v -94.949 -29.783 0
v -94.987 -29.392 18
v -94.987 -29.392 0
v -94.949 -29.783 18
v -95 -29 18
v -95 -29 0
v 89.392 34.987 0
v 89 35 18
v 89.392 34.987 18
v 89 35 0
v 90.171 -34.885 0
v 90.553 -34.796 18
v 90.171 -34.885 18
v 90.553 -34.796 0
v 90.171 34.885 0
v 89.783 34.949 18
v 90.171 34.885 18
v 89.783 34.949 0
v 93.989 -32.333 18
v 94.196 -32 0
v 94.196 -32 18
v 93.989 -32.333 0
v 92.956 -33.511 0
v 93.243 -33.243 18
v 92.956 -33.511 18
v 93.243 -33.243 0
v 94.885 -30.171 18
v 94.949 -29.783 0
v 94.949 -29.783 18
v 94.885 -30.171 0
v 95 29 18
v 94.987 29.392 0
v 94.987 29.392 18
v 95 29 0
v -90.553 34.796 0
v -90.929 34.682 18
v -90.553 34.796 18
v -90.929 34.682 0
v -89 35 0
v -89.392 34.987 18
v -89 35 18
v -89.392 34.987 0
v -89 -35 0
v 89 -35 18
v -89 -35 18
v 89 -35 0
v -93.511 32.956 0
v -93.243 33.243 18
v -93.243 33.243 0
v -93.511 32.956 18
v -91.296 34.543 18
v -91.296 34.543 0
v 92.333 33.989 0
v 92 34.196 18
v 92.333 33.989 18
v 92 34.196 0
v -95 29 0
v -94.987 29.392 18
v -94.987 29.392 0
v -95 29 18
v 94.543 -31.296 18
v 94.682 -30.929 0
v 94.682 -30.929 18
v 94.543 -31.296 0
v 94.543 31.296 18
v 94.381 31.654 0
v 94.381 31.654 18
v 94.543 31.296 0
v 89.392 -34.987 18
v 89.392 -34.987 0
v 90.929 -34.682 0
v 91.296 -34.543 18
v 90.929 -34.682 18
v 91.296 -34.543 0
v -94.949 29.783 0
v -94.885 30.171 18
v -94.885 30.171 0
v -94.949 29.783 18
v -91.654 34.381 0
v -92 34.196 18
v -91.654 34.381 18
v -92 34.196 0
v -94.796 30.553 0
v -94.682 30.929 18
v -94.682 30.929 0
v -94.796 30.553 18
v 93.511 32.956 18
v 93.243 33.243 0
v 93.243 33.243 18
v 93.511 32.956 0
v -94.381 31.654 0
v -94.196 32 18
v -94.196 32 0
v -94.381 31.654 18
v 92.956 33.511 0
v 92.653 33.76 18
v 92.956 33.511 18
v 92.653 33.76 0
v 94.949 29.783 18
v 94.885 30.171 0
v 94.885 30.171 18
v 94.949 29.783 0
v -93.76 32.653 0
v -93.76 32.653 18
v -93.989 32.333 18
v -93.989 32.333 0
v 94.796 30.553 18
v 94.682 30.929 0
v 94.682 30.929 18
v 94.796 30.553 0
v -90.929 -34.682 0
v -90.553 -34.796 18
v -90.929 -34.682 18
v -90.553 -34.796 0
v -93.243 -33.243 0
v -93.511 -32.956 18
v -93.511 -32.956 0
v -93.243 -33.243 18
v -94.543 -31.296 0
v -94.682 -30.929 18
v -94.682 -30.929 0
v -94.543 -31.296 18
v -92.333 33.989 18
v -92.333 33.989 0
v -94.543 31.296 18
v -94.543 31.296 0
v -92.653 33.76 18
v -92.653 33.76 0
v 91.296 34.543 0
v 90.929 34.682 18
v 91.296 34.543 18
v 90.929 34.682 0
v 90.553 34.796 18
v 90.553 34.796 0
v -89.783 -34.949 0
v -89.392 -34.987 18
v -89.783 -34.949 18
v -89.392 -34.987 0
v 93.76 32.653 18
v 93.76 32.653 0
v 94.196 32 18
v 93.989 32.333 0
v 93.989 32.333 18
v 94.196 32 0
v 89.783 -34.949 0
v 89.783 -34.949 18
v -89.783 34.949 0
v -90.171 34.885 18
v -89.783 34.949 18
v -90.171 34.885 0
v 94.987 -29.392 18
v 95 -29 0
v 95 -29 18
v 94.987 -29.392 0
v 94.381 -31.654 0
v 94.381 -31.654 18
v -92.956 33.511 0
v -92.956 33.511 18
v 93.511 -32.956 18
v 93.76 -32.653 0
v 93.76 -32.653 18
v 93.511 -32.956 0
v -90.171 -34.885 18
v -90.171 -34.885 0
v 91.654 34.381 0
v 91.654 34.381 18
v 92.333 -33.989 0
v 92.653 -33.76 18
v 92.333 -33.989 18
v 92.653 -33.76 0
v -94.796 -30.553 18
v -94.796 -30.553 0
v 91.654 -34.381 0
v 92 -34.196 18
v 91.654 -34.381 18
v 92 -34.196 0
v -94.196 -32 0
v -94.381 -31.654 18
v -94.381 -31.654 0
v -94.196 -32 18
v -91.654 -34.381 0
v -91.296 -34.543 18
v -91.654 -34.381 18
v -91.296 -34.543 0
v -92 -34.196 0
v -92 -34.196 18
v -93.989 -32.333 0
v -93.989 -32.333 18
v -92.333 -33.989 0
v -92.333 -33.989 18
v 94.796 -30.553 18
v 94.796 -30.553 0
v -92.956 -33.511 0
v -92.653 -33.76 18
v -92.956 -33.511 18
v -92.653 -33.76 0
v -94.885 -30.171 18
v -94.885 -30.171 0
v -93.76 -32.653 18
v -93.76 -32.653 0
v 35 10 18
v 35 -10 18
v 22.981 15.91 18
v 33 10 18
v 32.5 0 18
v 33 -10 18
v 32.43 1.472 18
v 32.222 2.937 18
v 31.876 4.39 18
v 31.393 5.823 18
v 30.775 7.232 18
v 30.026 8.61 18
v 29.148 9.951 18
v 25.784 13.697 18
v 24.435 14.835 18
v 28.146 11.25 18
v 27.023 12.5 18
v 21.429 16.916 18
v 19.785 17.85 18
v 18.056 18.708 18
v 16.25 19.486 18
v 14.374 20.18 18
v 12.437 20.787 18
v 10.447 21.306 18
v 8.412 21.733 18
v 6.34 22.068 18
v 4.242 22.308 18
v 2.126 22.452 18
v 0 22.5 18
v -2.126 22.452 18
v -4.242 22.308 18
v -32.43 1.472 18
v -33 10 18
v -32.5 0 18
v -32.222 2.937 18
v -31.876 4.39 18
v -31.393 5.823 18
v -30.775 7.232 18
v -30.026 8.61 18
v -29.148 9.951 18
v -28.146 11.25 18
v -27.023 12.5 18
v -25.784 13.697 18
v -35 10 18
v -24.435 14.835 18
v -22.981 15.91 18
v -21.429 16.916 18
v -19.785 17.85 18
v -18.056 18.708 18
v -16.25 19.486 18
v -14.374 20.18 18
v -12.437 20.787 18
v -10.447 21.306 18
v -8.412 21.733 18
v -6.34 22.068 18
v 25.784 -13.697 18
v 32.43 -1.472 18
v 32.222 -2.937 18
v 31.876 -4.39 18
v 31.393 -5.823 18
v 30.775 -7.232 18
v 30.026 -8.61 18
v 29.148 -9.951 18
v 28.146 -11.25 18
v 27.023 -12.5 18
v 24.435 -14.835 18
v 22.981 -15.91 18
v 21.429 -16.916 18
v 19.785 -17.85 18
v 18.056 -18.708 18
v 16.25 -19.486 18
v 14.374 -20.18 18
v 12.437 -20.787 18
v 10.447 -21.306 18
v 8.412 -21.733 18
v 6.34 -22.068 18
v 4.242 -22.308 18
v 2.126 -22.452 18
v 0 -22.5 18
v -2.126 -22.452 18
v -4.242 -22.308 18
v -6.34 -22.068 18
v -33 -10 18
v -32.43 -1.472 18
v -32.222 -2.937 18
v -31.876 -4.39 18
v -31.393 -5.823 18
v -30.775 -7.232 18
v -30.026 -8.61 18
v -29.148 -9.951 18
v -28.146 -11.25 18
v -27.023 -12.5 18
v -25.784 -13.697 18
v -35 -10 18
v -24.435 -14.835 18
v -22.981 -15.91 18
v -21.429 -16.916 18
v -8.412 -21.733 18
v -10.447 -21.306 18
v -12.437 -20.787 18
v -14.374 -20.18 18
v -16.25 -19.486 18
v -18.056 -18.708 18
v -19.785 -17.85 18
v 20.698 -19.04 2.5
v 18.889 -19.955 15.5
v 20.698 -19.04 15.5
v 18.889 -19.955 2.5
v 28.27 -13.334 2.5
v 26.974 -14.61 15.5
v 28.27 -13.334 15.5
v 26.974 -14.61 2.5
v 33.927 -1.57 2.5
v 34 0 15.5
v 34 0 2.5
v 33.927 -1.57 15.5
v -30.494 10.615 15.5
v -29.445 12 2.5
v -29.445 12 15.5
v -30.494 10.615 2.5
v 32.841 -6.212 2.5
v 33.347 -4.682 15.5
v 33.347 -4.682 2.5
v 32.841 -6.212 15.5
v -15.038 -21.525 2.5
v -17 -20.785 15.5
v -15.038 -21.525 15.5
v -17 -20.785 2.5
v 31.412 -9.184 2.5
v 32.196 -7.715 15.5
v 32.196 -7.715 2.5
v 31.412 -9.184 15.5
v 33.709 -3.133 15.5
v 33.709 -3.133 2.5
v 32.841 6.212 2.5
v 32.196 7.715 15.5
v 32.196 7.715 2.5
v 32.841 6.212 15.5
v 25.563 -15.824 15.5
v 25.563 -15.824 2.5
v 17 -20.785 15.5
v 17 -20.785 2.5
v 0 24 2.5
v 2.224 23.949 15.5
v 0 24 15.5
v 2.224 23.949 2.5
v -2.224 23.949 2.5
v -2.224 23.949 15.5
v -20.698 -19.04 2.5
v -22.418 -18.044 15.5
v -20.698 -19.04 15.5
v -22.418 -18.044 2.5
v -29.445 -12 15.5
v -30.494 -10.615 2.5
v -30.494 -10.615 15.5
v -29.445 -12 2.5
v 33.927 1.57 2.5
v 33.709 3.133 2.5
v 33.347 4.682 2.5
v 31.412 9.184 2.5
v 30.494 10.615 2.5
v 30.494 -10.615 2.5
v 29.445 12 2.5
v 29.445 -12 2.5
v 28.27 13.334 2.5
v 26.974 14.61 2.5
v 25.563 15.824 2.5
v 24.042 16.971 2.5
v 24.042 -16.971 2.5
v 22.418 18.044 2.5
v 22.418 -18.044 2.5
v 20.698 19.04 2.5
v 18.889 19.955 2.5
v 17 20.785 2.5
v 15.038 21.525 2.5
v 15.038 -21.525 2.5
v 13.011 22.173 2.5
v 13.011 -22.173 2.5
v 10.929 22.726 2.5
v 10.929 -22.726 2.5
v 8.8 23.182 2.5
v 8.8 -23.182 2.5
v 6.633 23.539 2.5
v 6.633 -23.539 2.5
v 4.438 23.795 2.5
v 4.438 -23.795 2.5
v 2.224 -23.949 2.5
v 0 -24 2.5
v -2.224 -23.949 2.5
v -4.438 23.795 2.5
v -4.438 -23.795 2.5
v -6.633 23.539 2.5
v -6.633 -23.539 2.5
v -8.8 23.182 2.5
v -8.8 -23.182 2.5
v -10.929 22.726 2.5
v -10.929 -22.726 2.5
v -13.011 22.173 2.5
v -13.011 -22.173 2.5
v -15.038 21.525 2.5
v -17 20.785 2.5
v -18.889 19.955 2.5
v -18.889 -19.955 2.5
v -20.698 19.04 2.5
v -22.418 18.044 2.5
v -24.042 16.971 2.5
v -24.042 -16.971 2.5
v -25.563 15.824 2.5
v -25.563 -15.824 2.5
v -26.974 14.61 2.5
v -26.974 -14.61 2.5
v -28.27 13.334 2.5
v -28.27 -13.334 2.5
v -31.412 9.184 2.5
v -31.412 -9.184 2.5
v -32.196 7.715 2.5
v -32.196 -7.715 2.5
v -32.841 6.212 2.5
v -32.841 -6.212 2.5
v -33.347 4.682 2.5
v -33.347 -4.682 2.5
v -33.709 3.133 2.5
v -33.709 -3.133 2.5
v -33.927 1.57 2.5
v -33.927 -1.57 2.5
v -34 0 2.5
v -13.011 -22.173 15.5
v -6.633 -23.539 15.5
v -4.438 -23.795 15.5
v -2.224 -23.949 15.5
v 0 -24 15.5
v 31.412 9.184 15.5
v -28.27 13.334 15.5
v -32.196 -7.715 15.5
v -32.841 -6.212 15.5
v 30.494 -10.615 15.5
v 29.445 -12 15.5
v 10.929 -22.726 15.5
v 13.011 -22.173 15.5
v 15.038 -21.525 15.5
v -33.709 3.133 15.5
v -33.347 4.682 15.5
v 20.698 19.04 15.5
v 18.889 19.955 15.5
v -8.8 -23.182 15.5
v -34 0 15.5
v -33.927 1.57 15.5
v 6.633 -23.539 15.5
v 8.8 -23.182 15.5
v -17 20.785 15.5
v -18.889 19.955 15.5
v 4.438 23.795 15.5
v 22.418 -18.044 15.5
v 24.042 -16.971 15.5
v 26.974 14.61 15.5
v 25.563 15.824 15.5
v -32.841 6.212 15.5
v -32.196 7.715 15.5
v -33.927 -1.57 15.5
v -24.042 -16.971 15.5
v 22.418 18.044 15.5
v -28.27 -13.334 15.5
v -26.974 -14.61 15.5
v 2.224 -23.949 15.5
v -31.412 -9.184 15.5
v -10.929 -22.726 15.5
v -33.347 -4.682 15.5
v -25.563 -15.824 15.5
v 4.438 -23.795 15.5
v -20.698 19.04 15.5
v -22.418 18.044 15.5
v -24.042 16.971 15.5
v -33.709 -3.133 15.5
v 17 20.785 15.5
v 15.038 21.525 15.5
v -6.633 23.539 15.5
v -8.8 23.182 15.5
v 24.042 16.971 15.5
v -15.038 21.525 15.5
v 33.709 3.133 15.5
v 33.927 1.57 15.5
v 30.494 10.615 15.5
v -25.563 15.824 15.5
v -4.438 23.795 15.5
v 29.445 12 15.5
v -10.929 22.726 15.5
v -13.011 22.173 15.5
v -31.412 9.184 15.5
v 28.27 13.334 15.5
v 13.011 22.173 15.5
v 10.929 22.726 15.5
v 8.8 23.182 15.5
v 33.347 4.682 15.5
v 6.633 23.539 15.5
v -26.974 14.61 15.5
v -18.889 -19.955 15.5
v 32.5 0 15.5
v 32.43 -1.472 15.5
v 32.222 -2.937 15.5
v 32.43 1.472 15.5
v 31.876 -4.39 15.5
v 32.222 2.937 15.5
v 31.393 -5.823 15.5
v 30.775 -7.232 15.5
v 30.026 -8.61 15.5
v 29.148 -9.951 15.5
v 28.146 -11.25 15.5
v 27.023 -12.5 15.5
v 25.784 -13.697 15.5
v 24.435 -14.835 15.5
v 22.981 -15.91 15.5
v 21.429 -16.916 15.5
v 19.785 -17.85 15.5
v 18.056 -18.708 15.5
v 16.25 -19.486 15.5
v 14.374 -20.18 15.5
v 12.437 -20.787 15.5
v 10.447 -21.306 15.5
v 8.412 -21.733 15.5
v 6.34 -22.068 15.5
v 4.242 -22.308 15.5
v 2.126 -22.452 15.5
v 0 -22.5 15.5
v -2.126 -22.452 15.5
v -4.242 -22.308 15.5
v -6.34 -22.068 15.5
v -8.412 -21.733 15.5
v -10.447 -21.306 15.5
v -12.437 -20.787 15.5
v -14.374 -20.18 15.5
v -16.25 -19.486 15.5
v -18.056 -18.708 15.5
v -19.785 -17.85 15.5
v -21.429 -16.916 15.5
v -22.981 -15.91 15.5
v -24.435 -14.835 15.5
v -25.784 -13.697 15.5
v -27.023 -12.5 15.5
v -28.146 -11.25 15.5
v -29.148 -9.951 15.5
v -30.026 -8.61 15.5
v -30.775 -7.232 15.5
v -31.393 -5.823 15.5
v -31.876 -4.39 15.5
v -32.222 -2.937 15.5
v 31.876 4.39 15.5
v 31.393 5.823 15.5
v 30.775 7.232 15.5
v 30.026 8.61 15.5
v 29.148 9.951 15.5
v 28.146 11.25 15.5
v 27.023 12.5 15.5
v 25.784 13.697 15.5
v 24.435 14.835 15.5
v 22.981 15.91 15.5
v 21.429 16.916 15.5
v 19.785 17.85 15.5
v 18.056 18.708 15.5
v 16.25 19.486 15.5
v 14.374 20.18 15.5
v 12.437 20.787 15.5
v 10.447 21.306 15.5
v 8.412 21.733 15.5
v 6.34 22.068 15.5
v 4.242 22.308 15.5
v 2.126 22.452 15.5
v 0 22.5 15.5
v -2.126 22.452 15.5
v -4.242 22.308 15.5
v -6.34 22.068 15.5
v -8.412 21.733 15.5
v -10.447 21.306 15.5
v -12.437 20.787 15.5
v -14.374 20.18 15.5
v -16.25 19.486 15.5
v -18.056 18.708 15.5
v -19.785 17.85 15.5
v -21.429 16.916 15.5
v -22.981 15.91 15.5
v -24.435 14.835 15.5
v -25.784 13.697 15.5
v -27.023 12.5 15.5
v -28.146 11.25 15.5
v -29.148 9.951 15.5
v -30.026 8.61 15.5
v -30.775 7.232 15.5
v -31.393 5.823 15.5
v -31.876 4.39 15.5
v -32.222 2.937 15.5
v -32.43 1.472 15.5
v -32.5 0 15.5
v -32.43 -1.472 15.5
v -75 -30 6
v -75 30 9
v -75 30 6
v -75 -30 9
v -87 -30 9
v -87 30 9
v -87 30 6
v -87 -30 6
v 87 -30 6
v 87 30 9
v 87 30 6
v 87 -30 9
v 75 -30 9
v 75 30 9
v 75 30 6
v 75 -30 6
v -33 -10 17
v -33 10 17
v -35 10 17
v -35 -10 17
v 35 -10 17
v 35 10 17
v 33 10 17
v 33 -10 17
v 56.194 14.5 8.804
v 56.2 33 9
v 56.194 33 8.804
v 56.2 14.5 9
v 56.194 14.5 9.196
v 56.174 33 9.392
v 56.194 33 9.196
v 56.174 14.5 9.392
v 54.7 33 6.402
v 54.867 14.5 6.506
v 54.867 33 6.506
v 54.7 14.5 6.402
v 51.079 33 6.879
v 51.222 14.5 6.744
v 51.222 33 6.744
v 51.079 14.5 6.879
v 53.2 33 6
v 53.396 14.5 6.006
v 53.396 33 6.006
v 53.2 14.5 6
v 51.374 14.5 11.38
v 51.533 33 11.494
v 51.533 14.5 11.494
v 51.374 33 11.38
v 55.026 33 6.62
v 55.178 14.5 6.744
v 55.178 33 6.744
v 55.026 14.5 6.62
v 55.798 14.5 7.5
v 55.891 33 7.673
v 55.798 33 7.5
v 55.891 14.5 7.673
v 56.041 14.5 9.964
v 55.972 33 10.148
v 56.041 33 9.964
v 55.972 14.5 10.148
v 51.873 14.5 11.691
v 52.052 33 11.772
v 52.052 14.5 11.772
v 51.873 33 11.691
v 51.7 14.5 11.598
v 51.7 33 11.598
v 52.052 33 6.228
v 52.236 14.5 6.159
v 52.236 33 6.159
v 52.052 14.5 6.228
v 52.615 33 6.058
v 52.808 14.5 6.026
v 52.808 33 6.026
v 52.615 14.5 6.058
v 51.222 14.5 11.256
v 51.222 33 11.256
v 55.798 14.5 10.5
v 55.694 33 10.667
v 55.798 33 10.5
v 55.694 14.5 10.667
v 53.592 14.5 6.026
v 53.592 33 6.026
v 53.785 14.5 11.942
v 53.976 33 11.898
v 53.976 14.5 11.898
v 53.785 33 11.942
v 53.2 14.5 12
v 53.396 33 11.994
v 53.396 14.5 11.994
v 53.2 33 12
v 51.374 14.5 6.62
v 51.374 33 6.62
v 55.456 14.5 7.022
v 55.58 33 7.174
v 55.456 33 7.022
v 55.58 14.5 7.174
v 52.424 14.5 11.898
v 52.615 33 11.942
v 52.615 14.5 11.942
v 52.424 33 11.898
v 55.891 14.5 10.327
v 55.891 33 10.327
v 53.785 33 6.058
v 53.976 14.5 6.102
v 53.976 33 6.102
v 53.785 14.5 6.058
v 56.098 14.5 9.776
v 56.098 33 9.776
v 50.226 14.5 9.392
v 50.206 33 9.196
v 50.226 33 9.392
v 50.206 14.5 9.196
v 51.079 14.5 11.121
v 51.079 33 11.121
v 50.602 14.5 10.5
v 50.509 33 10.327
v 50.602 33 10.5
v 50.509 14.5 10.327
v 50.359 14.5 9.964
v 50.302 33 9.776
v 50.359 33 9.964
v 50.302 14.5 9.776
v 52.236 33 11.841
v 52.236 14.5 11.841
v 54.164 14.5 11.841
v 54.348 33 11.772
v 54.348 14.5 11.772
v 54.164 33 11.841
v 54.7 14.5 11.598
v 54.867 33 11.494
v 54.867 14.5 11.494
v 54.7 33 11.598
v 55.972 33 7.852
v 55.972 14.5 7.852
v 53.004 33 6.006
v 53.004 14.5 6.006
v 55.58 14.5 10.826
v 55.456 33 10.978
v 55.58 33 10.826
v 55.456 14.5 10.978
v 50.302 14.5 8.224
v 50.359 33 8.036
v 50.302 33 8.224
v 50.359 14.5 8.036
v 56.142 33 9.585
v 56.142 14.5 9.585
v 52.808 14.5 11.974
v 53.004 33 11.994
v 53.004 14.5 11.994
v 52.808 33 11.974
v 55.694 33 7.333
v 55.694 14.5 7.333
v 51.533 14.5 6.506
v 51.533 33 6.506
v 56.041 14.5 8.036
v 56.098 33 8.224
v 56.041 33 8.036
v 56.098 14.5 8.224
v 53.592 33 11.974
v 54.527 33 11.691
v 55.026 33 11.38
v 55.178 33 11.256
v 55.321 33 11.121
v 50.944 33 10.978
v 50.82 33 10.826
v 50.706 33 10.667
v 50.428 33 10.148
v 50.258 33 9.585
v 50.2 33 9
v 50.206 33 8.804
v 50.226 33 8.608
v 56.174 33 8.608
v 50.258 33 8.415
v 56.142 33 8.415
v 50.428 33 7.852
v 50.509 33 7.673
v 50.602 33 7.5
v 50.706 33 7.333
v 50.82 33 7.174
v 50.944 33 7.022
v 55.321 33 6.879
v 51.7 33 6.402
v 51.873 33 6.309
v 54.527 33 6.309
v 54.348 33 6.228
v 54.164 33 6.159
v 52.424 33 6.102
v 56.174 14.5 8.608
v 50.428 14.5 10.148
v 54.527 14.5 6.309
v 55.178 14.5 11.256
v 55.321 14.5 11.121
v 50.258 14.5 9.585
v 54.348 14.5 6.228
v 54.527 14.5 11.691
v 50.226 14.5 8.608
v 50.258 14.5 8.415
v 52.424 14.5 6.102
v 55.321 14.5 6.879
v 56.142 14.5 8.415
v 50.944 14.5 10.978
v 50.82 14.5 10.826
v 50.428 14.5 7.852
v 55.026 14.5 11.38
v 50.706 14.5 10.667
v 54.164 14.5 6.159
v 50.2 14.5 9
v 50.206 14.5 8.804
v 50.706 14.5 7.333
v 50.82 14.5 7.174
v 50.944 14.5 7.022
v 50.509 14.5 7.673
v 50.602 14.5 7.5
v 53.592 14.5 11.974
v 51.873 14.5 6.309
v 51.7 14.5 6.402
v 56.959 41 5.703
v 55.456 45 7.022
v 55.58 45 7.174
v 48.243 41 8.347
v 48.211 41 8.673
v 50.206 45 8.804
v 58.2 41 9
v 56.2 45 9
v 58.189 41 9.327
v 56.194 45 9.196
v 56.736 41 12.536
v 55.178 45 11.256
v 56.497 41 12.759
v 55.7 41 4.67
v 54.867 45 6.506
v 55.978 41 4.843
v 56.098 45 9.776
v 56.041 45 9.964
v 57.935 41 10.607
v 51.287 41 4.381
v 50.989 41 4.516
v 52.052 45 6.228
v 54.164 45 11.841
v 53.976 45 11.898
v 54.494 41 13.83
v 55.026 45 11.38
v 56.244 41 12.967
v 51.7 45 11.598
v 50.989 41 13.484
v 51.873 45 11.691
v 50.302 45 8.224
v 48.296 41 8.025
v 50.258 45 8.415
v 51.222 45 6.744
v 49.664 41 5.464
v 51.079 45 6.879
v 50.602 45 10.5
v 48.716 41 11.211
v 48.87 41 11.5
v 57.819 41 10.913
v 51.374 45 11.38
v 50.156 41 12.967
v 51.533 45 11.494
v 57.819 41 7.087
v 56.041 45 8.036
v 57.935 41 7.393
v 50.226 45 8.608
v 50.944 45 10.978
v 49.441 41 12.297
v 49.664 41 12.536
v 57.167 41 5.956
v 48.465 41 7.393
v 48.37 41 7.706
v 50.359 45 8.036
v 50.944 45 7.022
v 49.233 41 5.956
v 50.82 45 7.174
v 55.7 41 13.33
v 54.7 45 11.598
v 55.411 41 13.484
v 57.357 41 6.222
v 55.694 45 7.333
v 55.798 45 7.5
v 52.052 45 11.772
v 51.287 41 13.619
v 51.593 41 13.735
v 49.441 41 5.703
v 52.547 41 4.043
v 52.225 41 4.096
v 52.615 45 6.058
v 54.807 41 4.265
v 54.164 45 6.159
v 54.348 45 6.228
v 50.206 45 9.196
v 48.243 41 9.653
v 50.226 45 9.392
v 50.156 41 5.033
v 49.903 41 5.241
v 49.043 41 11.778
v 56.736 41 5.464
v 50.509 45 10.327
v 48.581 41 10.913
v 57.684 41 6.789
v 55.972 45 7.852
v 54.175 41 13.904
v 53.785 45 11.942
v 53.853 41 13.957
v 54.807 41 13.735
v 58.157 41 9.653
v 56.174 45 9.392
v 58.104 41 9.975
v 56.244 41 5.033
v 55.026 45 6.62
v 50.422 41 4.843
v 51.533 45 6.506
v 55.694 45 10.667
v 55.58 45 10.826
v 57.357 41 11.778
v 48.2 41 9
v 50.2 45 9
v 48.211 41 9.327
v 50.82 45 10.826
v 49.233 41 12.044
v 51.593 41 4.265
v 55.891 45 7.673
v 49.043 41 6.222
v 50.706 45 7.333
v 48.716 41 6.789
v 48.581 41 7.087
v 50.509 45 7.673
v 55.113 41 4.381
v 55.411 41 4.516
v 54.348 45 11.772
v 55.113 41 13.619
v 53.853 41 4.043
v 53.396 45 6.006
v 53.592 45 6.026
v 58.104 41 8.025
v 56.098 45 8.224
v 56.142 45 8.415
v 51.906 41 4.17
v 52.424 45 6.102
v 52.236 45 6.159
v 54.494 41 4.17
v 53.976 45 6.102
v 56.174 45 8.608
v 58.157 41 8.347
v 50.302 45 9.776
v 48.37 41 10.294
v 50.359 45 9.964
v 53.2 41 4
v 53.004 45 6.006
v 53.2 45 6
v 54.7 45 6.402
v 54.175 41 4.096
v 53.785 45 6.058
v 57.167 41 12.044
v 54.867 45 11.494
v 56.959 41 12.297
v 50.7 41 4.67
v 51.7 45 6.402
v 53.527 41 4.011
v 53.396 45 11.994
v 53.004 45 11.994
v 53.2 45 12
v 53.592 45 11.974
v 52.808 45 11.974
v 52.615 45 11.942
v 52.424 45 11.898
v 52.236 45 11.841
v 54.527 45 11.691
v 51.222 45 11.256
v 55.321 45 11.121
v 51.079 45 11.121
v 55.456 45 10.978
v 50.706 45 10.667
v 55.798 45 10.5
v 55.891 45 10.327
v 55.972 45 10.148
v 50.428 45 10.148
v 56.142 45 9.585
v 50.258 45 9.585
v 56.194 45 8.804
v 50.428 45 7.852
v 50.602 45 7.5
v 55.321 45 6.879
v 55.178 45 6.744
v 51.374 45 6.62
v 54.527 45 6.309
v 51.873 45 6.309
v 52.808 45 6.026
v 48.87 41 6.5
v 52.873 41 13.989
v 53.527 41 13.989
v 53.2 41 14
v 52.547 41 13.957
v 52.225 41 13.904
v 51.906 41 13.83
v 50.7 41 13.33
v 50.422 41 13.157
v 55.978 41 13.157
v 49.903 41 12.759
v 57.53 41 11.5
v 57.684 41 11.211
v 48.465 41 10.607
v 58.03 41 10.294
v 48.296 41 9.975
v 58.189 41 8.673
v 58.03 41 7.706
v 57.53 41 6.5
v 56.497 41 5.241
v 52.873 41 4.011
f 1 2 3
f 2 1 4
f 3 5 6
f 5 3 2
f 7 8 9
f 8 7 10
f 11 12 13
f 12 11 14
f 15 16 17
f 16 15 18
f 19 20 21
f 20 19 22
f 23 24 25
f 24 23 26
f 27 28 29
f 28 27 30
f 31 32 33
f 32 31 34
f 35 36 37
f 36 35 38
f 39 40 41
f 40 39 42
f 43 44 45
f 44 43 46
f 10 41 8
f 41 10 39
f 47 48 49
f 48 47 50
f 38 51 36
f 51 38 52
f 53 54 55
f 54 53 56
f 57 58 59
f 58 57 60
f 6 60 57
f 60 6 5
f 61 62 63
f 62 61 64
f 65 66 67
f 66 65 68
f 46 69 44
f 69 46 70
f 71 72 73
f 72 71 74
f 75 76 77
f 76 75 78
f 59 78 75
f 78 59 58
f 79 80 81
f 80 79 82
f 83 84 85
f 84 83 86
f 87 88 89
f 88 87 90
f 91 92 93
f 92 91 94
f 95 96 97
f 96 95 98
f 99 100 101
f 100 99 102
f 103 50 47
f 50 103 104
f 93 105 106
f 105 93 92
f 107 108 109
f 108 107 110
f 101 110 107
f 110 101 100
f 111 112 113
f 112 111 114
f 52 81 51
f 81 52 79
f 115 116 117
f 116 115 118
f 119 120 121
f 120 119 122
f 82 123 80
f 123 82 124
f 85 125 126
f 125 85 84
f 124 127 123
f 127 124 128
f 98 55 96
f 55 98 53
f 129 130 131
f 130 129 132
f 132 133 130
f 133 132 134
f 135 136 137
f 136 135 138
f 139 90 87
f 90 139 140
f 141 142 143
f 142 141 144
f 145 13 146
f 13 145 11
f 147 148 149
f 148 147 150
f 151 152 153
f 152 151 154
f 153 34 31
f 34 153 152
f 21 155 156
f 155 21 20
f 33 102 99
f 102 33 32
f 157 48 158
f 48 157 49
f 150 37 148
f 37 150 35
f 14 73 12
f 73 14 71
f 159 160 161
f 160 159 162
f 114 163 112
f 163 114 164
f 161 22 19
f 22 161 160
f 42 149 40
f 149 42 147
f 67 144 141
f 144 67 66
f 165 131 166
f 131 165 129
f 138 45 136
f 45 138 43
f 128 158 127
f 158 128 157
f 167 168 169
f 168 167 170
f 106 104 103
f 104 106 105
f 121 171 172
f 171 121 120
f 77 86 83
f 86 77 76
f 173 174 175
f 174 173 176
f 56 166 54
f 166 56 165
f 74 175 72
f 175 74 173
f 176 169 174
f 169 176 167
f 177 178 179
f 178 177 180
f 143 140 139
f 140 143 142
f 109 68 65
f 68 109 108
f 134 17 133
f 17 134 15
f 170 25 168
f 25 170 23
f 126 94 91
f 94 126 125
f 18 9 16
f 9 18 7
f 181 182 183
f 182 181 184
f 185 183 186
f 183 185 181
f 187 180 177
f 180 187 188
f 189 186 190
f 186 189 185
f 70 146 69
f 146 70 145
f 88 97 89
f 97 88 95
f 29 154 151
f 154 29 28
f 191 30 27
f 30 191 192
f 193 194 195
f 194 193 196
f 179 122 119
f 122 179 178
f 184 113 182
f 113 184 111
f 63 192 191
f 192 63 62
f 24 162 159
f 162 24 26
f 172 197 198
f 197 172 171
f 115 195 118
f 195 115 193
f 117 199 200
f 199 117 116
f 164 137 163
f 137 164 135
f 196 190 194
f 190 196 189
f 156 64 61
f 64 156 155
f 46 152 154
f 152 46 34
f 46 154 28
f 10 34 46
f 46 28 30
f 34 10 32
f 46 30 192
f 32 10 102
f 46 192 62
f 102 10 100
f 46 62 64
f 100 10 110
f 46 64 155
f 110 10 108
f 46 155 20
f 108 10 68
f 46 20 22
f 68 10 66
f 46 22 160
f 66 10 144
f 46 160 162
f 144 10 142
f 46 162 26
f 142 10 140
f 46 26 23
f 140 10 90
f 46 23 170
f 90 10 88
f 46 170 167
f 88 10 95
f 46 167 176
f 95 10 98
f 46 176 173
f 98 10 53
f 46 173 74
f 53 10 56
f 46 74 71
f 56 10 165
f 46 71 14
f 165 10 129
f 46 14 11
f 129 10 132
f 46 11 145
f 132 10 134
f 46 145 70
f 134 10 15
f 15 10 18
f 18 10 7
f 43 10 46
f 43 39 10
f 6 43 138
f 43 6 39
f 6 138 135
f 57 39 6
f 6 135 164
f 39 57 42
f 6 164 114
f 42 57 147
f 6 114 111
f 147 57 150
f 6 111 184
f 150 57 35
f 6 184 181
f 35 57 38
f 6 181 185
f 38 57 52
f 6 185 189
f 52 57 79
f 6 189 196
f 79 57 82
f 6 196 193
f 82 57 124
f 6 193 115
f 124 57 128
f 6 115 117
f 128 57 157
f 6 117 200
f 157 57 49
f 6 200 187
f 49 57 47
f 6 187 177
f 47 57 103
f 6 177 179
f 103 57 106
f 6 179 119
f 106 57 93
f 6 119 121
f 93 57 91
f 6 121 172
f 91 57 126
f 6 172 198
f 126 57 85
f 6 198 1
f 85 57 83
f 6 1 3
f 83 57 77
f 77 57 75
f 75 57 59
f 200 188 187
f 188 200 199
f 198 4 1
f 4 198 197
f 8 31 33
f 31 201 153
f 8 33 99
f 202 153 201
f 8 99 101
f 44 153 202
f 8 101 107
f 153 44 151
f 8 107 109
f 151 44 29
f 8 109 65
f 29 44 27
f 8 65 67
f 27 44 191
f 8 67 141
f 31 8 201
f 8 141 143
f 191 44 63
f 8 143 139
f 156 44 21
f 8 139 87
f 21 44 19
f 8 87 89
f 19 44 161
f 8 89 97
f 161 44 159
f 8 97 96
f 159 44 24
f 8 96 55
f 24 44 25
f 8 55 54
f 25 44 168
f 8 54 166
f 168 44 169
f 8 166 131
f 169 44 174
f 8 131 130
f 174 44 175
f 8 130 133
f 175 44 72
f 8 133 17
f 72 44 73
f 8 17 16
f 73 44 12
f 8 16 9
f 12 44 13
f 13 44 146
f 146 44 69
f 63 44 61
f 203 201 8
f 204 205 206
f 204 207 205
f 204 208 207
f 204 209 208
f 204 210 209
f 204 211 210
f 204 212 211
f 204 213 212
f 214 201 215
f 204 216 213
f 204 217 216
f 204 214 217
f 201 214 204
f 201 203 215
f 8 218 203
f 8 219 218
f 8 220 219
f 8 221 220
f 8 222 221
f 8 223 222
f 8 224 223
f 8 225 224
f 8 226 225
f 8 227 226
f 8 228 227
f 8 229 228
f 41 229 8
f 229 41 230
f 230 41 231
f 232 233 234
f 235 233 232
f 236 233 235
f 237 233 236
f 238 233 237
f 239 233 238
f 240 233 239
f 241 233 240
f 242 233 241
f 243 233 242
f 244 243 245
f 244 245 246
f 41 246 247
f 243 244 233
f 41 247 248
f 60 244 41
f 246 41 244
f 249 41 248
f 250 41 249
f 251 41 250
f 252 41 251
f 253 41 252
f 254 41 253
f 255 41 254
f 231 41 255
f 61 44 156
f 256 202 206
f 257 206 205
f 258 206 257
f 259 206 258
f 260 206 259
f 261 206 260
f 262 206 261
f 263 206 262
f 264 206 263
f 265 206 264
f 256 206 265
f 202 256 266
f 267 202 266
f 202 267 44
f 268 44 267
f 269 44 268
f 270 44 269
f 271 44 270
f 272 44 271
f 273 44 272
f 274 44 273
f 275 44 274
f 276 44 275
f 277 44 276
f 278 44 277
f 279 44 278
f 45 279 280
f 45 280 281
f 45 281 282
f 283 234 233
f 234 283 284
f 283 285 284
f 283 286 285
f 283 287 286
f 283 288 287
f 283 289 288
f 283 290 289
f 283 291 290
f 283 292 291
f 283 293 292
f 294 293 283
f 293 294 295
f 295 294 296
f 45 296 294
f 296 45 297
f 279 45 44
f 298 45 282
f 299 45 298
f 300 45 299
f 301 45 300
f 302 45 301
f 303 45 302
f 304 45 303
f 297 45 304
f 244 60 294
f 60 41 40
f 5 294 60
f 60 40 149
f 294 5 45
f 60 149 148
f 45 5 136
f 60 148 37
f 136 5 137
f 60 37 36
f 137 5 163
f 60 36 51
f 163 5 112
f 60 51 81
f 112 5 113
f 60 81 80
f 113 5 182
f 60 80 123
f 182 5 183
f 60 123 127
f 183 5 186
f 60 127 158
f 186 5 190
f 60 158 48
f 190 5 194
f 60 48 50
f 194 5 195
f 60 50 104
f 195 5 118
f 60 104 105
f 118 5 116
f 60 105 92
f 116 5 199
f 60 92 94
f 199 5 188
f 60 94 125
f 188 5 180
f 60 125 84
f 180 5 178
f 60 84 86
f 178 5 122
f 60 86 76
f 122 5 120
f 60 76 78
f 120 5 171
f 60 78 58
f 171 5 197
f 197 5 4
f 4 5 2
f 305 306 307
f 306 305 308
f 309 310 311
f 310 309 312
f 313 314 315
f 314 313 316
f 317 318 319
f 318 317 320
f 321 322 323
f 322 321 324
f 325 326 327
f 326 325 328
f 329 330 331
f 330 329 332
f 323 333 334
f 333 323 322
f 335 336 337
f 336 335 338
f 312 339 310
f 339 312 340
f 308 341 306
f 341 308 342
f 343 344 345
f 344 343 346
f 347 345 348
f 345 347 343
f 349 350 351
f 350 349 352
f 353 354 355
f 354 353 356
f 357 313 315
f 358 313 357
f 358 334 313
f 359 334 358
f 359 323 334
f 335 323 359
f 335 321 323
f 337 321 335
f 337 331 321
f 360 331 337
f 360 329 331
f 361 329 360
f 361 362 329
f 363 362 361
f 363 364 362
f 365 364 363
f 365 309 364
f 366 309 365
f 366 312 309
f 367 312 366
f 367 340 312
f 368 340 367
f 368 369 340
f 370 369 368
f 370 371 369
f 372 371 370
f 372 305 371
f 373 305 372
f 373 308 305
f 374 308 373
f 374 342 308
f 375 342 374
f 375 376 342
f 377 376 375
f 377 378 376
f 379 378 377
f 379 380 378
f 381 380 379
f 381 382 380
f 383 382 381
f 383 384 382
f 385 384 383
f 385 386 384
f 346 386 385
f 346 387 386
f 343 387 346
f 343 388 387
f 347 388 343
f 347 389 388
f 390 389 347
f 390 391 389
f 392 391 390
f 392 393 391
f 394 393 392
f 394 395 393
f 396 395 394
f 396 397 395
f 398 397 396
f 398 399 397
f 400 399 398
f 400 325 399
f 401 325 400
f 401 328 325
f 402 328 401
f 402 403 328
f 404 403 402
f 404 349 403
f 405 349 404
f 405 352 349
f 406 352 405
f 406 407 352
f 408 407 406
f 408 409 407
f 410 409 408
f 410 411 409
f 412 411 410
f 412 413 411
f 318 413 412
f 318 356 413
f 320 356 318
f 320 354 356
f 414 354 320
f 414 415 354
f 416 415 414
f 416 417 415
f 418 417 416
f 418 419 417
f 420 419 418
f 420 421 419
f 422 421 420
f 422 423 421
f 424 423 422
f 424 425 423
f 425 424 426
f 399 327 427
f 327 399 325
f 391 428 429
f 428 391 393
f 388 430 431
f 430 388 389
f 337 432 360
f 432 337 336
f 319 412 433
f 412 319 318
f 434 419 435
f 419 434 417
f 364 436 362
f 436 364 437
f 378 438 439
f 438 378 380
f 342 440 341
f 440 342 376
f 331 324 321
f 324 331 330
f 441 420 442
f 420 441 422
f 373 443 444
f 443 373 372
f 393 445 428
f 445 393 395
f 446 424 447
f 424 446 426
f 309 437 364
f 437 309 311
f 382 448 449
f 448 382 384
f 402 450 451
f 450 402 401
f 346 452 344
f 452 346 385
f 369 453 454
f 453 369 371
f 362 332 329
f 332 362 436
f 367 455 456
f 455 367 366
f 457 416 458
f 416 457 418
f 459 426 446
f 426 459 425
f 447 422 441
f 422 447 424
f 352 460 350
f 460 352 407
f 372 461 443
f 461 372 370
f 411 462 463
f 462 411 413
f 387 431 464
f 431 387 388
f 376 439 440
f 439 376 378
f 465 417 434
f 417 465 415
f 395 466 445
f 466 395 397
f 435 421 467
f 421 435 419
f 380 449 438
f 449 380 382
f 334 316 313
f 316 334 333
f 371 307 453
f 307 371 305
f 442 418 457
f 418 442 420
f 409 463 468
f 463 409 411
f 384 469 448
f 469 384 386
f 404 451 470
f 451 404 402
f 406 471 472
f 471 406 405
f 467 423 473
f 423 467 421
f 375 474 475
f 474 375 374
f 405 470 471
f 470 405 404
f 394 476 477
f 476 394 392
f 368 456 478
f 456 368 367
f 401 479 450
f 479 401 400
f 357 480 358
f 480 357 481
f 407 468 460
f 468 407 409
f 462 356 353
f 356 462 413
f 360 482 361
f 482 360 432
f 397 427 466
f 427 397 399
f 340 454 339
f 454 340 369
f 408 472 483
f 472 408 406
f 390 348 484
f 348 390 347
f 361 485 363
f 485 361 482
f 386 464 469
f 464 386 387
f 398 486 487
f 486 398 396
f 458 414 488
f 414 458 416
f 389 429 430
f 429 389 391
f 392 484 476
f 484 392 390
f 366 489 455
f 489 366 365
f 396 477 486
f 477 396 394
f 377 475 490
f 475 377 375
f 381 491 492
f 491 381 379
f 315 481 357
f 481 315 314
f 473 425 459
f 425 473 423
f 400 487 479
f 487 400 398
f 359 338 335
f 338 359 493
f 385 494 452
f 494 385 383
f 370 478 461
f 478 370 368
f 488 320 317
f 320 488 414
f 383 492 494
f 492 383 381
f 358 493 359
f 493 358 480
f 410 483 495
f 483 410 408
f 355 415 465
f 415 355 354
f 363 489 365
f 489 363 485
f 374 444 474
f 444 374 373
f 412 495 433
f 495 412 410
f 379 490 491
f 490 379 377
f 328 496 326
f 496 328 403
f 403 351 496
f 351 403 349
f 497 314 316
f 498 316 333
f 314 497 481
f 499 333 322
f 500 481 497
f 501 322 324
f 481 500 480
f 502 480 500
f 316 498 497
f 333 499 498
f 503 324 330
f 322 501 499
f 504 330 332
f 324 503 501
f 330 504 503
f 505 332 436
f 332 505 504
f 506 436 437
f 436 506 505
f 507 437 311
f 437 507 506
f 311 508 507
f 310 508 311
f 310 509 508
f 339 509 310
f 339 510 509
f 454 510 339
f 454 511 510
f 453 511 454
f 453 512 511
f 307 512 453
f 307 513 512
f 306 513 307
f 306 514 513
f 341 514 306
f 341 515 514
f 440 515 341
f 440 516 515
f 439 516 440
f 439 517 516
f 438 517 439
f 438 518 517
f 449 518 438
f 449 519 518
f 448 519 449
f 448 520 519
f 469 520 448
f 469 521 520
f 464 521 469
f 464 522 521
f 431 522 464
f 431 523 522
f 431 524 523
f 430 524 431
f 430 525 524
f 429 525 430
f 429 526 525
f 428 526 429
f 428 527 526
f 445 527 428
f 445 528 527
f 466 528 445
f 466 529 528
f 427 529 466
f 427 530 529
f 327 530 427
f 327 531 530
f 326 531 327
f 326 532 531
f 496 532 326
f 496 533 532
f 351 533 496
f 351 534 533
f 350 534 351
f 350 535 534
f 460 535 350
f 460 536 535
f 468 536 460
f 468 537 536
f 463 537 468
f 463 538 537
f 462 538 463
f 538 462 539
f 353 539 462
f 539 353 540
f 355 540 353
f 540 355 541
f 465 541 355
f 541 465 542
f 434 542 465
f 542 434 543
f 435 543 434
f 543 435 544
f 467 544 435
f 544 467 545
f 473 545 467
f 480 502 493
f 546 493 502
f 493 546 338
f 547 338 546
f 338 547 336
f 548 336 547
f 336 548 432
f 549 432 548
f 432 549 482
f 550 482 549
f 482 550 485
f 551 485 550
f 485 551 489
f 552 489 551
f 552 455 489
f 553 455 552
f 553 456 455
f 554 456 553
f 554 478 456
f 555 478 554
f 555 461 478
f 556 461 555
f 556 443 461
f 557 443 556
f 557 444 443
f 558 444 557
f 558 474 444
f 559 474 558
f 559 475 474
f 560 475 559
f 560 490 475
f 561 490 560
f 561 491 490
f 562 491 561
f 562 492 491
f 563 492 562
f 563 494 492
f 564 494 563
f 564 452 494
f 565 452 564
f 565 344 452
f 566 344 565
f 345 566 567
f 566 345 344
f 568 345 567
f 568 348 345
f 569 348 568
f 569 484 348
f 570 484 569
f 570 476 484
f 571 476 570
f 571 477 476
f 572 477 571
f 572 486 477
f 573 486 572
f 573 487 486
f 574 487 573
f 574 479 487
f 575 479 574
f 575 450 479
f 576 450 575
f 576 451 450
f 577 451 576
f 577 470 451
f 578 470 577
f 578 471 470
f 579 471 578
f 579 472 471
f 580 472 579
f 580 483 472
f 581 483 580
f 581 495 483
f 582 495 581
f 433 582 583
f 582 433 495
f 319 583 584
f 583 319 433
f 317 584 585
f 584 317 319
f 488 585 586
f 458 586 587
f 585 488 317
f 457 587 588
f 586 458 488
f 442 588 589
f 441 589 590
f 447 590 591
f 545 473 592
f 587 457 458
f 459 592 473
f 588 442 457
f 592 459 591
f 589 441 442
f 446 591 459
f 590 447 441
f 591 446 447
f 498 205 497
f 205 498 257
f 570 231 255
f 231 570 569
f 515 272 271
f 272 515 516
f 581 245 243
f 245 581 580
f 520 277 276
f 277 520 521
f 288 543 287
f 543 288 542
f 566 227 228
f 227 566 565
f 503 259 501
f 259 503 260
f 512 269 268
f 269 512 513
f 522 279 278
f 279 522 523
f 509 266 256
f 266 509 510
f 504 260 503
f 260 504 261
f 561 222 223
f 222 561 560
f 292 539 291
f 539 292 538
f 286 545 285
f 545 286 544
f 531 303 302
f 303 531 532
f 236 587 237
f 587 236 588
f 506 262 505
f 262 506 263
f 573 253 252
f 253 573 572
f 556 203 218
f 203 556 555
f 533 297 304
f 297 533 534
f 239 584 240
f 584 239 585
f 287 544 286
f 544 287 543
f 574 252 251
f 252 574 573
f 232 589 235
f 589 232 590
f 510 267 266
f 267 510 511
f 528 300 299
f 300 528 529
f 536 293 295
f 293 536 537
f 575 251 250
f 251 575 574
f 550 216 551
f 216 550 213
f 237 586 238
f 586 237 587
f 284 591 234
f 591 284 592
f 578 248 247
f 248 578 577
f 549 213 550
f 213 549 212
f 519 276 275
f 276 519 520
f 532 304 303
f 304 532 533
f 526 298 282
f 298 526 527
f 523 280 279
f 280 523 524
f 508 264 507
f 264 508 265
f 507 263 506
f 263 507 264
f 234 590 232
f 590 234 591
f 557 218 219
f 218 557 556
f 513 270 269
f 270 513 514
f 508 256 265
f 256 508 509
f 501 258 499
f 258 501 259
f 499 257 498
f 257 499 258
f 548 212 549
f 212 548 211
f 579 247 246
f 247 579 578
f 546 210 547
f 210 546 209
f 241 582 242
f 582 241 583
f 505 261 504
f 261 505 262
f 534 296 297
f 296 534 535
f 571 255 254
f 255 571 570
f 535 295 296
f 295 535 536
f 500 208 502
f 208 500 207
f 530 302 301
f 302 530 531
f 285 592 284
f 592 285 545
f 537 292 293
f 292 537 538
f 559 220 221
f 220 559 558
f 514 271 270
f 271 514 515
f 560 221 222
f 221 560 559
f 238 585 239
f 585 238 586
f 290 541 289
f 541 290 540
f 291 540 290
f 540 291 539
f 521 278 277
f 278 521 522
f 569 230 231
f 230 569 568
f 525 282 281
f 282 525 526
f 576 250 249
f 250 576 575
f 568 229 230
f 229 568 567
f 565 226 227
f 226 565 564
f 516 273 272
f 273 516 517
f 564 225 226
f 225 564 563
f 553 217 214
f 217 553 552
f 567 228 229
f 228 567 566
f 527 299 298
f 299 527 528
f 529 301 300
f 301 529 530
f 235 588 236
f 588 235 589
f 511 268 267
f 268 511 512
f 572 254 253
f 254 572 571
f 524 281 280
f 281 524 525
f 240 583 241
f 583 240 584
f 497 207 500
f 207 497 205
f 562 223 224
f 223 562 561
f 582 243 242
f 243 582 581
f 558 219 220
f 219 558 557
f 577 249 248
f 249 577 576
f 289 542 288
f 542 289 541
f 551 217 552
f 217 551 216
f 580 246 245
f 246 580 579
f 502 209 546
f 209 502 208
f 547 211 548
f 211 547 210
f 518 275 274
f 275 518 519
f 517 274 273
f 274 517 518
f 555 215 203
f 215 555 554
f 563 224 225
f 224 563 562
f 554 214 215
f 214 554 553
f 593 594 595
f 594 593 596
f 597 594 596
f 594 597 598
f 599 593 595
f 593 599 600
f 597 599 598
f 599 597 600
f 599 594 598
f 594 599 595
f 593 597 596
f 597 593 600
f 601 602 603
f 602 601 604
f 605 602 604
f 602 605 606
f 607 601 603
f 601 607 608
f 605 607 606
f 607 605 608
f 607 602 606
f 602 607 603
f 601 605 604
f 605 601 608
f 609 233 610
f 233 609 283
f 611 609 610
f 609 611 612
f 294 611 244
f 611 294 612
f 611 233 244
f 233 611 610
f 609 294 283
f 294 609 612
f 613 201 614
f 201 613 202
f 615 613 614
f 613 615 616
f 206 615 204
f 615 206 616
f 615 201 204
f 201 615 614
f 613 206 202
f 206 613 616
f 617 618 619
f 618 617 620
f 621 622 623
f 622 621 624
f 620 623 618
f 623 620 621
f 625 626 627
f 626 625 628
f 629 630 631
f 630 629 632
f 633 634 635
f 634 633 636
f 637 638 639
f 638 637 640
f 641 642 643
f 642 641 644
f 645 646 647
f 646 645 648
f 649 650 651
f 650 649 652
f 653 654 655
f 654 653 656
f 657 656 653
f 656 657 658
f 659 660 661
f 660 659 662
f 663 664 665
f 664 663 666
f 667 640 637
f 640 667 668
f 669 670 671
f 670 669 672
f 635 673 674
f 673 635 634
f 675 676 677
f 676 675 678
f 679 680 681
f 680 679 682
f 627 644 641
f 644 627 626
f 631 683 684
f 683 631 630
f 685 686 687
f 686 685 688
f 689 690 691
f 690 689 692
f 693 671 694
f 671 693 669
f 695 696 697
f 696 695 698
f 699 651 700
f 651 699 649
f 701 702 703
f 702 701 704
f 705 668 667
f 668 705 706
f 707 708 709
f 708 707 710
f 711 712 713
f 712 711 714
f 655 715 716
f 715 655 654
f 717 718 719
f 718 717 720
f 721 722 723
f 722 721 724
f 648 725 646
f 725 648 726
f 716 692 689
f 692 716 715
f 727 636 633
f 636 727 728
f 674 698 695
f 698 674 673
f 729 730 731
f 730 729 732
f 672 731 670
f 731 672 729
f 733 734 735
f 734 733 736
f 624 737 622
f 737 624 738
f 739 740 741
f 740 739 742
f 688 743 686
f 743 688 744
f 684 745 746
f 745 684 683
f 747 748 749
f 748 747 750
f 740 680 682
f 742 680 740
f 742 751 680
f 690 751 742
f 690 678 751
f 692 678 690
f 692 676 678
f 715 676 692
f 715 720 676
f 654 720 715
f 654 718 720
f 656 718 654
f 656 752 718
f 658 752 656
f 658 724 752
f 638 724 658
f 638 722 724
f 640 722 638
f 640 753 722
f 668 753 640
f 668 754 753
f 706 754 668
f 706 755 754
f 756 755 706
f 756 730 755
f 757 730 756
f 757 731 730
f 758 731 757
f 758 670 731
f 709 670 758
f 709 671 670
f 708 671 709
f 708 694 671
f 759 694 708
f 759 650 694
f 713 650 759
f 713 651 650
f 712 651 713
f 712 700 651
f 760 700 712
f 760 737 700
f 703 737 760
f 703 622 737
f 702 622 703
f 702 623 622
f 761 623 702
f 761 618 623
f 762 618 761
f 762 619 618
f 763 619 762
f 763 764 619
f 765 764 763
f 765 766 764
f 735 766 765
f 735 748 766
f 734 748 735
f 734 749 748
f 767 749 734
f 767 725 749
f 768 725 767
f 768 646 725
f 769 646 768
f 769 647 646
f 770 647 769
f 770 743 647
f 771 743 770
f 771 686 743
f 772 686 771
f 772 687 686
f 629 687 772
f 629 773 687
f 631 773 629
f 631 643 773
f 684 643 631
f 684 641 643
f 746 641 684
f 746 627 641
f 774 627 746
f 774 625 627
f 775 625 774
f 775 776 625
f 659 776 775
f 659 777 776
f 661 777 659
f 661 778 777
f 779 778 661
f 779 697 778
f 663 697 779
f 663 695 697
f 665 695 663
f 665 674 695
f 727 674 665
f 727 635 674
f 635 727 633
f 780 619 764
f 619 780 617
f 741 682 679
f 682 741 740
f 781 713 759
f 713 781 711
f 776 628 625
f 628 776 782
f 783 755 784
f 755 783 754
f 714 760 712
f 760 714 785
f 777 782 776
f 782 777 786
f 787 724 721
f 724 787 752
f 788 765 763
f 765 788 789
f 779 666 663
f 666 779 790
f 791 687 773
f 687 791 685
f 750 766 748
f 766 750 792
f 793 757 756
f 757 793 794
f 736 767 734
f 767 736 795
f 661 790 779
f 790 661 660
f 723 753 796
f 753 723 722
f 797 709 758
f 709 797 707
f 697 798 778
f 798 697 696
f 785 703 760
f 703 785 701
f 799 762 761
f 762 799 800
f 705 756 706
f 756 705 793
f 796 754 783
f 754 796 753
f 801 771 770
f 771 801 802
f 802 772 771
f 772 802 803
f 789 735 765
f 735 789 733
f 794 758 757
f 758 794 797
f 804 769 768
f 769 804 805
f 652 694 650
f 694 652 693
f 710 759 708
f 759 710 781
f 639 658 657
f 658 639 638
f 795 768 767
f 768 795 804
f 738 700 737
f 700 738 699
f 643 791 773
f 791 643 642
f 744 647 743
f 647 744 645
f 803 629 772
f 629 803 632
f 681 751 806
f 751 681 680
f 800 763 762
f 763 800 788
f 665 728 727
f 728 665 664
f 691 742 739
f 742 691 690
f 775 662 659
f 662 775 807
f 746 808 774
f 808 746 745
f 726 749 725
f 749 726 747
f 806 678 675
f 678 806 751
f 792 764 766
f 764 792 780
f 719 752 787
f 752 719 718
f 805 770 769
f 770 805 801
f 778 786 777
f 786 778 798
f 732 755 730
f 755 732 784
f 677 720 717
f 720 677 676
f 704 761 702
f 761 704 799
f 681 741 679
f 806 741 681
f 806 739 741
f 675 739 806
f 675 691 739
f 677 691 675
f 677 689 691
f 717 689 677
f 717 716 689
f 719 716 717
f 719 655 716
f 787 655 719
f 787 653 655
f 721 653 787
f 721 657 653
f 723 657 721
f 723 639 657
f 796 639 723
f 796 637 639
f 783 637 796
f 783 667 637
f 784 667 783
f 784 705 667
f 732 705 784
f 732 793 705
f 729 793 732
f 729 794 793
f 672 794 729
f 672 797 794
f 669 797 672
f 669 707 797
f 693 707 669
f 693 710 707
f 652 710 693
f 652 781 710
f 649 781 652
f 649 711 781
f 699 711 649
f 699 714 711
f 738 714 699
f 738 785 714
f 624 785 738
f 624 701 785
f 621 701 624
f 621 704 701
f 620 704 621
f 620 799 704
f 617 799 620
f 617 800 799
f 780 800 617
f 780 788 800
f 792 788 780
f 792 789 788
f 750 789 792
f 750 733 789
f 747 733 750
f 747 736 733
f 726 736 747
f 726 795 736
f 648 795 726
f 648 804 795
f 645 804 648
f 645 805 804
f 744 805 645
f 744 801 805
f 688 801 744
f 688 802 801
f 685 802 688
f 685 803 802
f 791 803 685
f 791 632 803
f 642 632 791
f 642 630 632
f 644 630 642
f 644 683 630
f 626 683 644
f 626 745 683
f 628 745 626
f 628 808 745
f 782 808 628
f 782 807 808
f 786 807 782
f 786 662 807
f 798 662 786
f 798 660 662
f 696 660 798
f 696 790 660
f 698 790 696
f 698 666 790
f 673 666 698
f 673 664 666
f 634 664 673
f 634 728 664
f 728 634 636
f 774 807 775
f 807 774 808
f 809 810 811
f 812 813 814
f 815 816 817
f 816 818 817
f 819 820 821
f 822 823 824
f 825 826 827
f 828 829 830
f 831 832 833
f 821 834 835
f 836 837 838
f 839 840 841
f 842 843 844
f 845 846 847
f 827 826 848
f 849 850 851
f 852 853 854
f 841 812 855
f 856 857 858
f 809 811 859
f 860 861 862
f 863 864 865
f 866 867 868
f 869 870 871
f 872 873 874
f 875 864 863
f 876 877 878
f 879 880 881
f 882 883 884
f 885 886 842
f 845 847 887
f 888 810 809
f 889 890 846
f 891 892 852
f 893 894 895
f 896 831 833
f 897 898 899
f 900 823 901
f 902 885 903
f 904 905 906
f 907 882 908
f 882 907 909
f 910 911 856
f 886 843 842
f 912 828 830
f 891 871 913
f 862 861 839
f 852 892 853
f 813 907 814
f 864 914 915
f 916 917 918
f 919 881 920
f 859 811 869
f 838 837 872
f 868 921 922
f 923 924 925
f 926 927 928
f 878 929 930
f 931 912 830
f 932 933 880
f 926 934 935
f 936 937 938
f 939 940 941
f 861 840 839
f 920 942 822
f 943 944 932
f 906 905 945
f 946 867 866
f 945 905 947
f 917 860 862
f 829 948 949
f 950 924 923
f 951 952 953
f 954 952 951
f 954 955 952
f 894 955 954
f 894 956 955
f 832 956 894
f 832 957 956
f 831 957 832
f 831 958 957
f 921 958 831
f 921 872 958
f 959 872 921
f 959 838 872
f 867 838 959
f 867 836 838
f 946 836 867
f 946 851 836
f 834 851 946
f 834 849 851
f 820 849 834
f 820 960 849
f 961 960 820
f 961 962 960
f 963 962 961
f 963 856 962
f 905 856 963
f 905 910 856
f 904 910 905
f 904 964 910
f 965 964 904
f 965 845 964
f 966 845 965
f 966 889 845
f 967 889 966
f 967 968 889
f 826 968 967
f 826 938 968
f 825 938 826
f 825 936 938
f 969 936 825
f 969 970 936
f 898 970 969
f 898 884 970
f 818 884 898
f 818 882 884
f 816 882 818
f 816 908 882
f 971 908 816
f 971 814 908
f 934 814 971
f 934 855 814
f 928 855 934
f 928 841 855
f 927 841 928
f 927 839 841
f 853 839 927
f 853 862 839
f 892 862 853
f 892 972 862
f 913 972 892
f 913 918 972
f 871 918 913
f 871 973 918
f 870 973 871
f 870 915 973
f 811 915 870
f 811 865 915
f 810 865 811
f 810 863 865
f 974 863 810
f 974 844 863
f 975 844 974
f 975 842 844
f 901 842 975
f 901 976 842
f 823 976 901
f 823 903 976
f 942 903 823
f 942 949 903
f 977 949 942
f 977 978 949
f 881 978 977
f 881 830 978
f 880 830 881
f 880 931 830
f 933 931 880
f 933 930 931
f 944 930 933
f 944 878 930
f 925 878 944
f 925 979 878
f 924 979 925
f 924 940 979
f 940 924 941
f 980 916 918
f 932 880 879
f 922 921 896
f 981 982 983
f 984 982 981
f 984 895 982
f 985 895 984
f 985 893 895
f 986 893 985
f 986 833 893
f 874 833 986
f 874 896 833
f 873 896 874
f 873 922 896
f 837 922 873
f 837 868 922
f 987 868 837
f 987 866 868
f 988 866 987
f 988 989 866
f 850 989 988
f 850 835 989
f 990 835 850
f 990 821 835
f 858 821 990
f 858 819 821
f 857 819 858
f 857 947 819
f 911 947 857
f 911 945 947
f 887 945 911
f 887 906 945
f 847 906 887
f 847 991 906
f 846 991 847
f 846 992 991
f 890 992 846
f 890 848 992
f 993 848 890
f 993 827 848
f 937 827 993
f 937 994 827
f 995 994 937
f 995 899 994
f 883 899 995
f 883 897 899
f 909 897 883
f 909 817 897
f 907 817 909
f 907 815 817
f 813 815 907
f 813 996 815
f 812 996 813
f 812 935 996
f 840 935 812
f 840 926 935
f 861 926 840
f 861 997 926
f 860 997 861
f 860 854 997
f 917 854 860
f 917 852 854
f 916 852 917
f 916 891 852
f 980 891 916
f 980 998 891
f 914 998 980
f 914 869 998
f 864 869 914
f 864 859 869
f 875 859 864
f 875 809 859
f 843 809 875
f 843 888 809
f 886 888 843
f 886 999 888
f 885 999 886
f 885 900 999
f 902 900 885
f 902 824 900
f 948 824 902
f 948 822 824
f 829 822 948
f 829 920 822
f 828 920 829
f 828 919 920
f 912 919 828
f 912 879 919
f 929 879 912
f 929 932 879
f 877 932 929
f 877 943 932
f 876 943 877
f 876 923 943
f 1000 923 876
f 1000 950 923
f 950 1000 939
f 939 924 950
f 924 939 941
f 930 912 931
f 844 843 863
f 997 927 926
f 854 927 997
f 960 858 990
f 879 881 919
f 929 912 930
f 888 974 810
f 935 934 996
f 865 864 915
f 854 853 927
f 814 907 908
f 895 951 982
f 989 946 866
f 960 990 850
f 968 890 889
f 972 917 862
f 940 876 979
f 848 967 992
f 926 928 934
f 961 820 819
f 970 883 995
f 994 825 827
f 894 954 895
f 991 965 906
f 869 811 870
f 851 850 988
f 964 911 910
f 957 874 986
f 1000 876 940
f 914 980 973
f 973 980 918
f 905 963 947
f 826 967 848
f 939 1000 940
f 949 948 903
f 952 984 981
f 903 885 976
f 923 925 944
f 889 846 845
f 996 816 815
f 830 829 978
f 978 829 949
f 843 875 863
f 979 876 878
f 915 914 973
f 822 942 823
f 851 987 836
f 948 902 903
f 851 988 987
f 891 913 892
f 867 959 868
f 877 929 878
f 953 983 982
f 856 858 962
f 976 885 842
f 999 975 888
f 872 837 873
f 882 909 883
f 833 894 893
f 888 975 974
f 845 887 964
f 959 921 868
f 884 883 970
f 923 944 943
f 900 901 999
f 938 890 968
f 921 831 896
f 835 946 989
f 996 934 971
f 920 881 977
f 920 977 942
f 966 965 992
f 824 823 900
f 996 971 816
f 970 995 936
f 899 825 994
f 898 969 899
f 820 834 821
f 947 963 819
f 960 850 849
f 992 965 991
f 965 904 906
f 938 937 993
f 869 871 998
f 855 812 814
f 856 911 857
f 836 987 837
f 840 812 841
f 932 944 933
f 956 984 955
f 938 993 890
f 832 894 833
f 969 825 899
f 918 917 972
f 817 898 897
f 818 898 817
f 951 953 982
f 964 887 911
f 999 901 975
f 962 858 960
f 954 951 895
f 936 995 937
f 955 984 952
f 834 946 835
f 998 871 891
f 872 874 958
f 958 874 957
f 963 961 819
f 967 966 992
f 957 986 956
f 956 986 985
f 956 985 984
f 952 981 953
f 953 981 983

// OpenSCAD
// ============================================================
// Smart Tourniquet System — Bladder Housing (Backing Plate)
// Kelompok 19 — Desain Proyek Teknik Elektro, Komputer, Biomedik 2
//
// Ukuran luar: 190mm x 70mm (ditentukan tim, membentang sepanjang strap)
// ============================================================

$fn = 96;

housing_outer_l = 190; housing_outer_w = 70; housing_corner_r = 6;
pad_length = 60; pad_width = 40; pad_max_thickness = 15;
housing_wall = 2.5; housing_depth = pad_max_thickness + 3;
foam_layer_thickness = 2;
strap_slot_h = 3; strap_slot_w = 60; strap_slot_inset = 8;
tube_channel_d = 6; tube_strain_relief_length = 14;
alignment_mark_w = 2; alignment_mark_length = 20;

module rounded_rect_centered(l, w, r) {
    hull() { for (x=[-(l/2-r),(l/2-r)]) for (y=[-(w/2-r),(w/2-r)]) translate([x,y,0]) circle(r=r); }
}
module oval_profile(l, w) { scale([l/2, w/2, 1]) circle(r=1, $fn=$fn); }

module housing_shell() {
    difference() {
        linear_extrude(height=housing_depth) rounded_rect_centered(housing_outer_l, housing_outer_w, housing_corner_r);
        translate([0,0,housing_wall]) linear_extrude(height=housing_depth)
            oval_profile(pad_length+2*foam_layer_thickness+4, pad_width+2*foam_layer_thickness+4);
    }
}
module retention_rim() {
    rim_height = 2.5; rim_lip = 1.5;
    translate([0,0,housing_depth-rim_height])
        difference() {
            linear_extrude(height=rim_height) oval_profile(pad_length+2*foam_layer_thickness+4, pad_width+2*foam_layer_thickness+4);
            translate([0,0,-0.1]) linear_extrude(height=rim_height+0.2)
                oval_profile(pad_length+2*foam_layer_thickness+4-2*rim_lip, pad_width+2*foam_layer_thickness+4-2*rim_lip);
        }
}
module strap_slots() {
    for (side=[-1,1])
        translate([side*(housing_outer_l/2-strap_slot_inset-6), 0, housing_depth/2-strap_slot_h/2])
            cube([12, strap_slot_w, strap_slot_h], center=true);
}
module pneumatic_channel() {
    translate([housing_outer_l*0.28, housing_outer_w/2-2, housing_depth/2])
        rotate([90,0,0]) cylinder(h=foam_layer_thickness+housing_wall+tube_strain_relief_length, d=tube_channel_d);
}
module strain_relief_funnel() {
    translate([housing_outer_l*0.28, housing_outer_w/2+tube_strain_relief_length-4, housing_depth/2])
        rotate([90,0,0]) cylinder(h=4, d1=tube_channel_d, d2=tube_channel_d+4);
}
module alignment_marks() {
    for (side=[-1,1])
        translate([side*(pad_length/2+foam_layer_thickness+2), 0, housing_depth-0.5])
            cube([alignment_mark_w, alignment_mark_length, 1], center=true);
}
module bladder_housing() {
    difference() {
        union() { housing_shell(); retention_rim(); }
        strap_slots(); pneumatic_channel(); alignment_marks();
    }
    strain_relief_funnel();
}
bladder_housing();
